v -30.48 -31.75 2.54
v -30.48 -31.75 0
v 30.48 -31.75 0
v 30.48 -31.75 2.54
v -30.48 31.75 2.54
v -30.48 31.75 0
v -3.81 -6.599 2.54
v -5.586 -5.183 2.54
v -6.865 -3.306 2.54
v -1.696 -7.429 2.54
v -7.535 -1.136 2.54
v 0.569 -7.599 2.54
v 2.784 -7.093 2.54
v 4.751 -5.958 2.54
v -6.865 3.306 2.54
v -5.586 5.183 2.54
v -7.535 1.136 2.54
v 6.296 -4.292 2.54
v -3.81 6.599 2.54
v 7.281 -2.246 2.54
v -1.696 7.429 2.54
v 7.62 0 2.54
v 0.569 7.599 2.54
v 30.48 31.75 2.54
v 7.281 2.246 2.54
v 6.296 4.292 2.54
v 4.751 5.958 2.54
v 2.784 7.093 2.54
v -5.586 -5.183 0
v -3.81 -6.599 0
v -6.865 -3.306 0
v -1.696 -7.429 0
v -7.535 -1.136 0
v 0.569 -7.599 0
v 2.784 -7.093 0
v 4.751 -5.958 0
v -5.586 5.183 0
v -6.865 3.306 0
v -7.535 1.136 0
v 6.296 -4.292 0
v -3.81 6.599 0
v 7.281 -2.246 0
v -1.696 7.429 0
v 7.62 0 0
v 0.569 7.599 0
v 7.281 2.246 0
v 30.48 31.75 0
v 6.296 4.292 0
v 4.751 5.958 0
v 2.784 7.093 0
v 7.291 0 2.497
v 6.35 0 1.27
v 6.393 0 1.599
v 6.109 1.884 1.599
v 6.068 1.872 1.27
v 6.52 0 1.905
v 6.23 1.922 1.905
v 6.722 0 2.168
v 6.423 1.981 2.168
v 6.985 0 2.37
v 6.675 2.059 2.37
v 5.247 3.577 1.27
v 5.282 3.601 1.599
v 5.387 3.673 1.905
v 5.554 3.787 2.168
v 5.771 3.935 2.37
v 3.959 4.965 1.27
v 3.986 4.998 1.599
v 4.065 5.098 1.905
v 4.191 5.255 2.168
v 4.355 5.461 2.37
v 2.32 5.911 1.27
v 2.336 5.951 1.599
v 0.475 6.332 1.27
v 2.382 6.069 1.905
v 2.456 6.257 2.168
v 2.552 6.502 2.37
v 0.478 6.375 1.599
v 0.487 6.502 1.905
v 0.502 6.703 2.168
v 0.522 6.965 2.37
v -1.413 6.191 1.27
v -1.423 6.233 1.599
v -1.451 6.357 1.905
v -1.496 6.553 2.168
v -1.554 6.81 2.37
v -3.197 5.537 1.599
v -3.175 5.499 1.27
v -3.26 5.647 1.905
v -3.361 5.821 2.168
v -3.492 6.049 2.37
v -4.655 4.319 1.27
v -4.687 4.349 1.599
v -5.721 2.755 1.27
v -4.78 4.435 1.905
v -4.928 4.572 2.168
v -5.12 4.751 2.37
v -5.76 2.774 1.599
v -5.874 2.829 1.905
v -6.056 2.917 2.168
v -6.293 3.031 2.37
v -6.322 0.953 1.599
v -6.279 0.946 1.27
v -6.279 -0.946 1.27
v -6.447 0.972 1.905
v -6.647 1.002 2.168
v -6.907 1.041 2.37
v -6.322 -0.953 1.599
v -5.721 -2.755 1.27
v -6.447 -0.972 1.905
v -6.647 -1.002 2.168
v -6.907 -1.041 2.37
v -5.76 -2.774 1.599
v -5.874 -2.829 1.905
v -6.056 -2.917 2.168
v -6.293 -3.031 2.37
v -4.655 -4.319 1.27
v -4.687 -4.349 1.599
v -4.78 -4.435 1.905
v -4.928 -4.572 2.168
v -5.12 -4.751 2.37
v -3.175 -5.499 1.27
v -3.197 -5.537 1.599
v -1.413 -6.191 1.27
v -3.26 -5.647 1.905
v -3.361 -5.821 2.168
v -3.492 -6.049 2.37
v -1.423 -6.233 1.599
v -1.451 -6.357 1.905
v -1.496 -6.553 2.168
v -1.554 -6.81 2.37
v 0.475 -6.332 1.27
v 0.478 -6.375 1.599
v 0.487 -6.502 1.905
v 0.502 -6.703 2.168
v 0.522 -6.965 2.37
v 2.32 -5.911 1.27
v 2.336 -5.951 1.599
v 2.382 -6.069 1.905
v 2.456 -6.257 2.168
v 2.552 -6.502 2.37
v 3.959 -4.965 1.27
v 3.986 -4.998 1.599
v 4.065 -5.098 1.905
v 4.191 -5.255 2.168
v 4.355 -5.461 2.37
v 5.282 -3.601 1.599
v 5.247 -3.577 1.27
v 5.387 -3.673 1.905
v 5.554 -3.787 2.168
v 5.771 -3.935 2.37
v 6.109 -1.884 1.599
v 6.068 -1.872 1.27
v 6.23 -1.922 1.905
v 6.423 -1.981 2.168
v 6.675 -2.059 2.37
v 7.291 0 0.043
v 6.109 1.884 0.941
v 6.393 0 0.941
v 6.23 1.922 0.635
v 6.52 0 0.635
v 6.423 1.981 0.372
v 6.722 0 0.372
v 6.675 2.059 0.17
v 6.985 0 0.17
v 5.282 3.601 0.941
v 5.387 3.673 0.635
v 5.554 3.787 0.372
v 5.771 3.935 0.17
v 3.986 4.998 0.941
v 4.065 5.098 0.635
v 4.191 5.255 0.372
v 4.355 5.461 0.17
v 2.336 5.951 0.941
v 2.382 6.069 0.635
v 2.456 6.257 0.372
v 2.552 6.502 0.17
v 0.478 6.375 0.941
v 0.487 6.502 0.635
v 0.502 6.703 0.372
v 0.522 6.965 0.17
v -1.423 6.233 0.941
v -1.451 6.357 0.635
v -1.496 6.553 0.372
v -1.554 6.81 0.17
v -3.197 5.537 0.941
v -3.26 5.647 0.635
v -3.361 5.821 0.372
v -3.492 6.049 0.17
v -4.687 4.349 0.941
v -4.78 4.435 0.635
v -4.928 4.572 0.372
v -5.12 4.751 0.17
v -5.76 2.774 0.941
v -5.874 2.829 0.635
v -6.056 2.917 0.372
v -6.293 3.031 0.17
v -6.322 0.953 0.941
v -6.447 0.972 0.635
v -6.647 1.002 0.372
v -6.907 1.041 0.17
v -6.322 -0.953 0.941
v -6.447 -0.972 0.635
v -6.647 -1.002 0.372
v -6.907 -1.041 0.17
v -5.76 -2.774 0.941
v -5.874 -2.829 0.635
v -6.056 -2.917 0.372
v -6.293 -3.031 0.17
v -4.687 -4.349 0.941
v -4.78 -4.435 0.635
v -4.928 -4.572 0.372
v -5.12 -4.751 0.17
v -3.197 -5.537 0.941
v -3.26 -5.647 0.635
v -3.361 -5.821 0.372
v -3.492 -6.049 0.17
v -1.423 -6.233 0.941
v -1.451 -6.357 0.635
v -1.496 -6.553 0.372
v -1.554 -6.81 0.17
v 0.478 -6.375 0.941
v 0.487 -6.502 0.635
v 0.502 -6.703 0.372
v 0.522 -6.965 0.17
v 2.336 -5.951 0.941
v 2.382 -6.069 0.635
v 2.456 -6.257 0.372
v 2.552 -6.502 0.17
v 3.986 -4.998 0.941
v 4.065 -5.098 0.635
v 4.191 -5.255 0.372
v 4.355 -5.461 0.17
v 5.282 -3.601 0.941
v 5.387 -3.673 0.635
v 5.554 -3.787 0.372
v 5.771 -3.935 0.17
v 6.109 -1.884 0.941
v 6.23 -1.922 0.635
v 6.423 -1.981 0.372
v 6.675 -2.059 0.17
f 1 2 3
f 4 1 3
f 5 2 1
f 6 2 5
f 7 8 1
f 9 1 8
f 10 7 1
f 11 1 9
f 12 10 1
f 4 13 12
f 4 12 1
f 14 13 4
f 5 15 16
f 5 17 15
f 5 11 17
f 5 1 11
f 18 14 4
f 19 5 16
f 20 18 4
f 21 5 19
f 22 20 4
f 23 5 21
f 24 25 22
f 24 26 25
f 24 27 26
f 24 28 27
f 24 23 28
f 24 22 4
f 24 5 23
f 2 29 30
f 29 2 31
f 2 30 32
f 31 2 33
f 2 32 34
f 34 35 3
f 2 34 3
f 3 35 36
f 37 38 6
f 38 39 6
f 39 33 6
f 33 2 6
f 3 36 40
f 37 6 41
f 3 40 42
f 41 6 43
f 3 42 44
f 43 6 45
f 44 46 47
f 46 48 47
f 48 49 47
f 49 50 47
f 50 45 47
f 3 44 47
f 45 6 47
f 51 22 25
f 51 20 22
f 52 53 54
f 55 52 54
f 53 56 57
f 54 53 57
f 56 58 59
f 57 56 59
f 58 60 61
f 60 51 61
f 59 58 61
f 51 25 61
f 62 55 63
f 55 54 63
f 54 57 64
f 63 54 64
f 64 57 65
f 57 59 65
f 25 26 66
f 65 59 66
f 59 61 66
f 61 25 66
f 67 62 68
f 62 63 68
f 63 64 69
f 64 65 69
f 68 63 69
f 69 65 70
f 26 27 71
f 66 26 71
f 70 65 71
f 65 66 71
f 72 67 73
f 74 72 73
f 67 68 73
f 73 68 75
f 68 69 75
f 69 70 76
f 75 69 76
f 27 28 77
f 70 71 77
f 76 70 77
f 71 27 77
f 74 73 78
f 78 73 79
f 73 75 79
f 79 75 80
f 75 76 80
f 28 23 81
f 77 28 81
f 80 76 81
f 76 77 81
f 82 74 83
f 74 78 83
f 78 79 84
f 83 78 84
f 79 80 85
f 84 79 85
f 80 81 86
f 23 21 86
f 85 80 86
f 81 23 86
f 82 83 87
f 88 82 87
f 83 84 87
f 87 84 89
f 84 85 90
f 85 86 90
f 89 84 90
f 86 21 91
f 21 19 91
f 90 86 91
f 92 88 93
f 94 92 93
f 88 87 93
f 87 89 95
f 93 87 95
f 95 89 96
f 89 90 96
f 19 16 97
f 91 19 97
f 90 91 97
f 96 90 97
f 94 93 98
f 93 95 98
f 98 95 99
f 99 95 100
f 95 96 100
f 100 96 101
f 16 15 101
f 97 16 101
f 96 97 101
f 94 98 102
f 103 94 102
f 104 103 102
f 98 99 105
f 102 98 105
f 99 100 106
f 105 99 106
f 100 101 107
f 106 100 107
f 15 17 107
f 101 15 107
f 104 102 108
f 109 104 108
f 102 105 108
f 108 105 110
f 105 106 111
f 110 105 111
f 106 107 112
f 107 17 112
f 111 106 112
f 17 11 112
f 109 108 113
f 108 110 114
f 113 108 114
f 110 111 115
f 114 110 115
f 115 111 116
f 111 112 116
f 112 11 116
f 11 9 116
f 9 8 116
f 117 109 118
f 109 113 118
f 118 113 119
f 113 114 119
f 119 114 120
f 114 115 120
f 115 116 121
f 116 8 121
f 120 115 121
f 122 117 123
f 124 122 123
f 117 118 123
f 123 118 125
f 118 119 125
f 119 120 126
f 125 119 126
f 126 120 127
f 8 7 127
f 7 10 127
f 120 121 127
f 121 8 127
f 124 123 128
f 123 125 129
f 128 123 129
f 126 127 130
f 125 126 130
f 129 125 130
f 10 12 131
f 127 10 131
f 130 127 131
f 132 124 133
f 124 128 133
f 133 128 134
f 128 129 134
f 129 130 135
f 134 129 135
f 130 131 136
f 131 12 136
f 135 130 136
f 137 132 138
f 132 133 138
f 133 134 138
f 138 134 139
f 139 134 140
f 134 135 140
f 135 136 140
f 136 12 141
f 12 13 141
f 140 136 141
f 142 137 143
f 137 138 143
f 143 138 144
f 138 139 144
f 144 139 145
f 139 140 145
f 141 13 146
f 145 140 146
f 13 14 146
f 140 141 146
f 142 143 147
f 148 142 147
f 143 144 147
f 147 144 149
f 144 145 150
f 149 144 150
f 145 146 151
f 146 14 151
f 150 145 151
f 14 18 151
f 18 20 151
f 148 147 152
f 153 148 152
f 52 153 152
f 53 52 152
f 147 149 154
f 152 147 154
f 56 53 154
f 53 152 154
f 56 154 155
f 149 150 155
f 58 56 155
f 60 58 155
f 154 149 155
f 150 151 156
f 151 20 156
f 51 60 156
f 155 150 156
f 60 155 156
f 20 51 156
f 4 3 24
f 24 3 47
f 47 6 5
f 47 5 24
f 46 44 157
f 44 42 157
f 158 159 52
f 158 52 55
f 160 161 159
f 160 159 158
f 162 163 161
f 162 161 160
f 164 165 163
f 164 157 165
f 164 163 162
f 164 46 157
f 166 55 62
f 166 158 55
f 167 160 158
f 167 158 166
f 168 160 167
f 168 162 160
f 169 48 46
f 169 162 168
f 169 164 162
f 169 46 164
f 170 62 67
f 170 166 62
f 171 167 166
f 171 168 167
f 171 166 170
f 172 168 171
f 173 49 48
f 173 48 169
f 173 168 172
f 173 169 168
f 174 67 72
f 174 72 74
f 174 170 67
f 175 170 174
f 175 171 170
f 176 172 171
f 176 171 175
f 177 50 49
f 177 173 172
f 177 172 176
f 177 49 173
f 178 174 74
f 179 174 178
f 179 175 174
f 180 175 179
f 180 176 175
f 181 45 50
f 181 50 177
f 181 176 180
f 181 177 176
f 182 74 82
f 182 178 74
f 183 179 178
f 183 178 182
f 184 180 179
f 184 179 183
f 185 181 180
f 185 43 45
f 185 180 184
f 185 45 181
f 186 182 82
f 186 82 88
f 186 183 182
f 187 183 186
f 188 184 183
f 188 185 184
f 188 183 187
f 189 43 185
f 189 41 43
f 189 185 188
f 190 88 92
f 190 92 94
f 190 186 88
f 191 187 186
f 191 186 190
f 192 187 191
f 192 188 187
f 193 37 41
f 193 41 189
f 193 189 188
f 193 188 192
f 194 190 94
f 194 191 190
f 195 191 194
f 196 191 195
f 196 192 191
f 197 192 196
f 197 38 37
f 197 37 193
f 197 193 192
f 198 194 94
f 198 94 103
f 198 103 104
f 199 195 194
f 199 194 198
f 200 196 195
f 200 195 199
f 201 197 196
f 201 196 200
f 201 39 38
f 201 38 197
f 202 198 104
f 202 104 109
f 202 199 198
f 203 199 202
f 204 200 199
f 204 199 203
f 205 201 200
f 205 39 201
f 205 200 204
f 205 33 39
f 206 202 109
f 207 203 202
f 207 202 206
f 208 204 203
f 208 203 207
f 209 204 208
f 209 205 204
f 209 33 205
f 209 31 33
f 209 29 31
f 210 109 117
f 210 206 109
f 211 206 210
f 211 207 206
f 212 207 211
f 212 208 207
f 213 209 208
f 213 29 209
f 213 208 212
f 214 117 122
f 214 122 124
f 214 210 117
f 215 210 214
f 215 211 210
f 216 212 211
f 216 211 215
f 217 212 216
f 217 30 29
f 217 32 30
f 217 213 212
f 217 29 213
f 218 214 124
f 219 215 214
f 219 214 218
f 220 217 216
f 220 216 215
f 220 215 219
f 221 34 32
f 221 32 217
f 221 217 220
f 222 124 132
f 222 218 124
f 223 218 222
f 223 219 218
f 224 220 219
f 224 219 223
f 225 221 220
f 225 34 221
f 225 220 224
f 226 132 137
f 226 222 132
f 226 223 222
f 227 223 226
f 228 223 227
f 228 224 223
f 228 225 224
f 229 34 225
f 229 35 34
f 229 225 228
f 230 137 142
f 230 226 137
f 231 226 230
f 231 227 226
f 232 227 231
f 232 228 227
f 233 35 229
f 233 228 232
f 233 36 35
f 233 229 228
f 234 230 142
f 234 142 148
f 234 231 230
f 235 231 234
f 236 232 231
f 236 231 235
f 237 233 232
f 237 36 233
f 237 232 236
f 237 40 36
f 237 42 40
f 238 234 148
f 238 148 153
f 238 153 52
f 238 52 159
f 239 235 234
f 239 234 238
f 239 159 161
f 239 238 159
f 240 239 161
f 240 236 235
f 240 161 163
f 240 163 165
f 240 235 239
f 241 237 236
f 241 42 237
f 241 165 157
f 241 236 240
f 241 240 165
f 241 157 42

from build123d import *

# Parameters (mm, degrees)
F0_W     = 60.96
F0_H     = 63.5
F0_R     = 6.35
F1_DEPTH = 2.54
F2_R     = 1.26999


# Not quite as in the source:
# - a fillet or chamfer is up to 0.001 mm smaller than in the source, because OpenCascade refuses the exact size


with BuildPart() as f1:
    # F0 (on Top) → F1 (new body)
    with BuildSketch(Plane.XY):
        Rectangle(F0_W, F0_H)
        Circle(F0_R, mode=Mode.SUBTRACT)
    extrude(amount=F1_DEPTH)

    # F2 (radius 1.27 in the source; OpenCascade refuses exactly that, so slightly less here)
    f2_edges = [f1.edges().sort_by_distance(p)[0] for p in [
        (-6.35, 0, 2.54),
        (-6.35, 0, 0),
    ]]
    fillet(f2_edges, radius=F2_R)


solid = f1.part
